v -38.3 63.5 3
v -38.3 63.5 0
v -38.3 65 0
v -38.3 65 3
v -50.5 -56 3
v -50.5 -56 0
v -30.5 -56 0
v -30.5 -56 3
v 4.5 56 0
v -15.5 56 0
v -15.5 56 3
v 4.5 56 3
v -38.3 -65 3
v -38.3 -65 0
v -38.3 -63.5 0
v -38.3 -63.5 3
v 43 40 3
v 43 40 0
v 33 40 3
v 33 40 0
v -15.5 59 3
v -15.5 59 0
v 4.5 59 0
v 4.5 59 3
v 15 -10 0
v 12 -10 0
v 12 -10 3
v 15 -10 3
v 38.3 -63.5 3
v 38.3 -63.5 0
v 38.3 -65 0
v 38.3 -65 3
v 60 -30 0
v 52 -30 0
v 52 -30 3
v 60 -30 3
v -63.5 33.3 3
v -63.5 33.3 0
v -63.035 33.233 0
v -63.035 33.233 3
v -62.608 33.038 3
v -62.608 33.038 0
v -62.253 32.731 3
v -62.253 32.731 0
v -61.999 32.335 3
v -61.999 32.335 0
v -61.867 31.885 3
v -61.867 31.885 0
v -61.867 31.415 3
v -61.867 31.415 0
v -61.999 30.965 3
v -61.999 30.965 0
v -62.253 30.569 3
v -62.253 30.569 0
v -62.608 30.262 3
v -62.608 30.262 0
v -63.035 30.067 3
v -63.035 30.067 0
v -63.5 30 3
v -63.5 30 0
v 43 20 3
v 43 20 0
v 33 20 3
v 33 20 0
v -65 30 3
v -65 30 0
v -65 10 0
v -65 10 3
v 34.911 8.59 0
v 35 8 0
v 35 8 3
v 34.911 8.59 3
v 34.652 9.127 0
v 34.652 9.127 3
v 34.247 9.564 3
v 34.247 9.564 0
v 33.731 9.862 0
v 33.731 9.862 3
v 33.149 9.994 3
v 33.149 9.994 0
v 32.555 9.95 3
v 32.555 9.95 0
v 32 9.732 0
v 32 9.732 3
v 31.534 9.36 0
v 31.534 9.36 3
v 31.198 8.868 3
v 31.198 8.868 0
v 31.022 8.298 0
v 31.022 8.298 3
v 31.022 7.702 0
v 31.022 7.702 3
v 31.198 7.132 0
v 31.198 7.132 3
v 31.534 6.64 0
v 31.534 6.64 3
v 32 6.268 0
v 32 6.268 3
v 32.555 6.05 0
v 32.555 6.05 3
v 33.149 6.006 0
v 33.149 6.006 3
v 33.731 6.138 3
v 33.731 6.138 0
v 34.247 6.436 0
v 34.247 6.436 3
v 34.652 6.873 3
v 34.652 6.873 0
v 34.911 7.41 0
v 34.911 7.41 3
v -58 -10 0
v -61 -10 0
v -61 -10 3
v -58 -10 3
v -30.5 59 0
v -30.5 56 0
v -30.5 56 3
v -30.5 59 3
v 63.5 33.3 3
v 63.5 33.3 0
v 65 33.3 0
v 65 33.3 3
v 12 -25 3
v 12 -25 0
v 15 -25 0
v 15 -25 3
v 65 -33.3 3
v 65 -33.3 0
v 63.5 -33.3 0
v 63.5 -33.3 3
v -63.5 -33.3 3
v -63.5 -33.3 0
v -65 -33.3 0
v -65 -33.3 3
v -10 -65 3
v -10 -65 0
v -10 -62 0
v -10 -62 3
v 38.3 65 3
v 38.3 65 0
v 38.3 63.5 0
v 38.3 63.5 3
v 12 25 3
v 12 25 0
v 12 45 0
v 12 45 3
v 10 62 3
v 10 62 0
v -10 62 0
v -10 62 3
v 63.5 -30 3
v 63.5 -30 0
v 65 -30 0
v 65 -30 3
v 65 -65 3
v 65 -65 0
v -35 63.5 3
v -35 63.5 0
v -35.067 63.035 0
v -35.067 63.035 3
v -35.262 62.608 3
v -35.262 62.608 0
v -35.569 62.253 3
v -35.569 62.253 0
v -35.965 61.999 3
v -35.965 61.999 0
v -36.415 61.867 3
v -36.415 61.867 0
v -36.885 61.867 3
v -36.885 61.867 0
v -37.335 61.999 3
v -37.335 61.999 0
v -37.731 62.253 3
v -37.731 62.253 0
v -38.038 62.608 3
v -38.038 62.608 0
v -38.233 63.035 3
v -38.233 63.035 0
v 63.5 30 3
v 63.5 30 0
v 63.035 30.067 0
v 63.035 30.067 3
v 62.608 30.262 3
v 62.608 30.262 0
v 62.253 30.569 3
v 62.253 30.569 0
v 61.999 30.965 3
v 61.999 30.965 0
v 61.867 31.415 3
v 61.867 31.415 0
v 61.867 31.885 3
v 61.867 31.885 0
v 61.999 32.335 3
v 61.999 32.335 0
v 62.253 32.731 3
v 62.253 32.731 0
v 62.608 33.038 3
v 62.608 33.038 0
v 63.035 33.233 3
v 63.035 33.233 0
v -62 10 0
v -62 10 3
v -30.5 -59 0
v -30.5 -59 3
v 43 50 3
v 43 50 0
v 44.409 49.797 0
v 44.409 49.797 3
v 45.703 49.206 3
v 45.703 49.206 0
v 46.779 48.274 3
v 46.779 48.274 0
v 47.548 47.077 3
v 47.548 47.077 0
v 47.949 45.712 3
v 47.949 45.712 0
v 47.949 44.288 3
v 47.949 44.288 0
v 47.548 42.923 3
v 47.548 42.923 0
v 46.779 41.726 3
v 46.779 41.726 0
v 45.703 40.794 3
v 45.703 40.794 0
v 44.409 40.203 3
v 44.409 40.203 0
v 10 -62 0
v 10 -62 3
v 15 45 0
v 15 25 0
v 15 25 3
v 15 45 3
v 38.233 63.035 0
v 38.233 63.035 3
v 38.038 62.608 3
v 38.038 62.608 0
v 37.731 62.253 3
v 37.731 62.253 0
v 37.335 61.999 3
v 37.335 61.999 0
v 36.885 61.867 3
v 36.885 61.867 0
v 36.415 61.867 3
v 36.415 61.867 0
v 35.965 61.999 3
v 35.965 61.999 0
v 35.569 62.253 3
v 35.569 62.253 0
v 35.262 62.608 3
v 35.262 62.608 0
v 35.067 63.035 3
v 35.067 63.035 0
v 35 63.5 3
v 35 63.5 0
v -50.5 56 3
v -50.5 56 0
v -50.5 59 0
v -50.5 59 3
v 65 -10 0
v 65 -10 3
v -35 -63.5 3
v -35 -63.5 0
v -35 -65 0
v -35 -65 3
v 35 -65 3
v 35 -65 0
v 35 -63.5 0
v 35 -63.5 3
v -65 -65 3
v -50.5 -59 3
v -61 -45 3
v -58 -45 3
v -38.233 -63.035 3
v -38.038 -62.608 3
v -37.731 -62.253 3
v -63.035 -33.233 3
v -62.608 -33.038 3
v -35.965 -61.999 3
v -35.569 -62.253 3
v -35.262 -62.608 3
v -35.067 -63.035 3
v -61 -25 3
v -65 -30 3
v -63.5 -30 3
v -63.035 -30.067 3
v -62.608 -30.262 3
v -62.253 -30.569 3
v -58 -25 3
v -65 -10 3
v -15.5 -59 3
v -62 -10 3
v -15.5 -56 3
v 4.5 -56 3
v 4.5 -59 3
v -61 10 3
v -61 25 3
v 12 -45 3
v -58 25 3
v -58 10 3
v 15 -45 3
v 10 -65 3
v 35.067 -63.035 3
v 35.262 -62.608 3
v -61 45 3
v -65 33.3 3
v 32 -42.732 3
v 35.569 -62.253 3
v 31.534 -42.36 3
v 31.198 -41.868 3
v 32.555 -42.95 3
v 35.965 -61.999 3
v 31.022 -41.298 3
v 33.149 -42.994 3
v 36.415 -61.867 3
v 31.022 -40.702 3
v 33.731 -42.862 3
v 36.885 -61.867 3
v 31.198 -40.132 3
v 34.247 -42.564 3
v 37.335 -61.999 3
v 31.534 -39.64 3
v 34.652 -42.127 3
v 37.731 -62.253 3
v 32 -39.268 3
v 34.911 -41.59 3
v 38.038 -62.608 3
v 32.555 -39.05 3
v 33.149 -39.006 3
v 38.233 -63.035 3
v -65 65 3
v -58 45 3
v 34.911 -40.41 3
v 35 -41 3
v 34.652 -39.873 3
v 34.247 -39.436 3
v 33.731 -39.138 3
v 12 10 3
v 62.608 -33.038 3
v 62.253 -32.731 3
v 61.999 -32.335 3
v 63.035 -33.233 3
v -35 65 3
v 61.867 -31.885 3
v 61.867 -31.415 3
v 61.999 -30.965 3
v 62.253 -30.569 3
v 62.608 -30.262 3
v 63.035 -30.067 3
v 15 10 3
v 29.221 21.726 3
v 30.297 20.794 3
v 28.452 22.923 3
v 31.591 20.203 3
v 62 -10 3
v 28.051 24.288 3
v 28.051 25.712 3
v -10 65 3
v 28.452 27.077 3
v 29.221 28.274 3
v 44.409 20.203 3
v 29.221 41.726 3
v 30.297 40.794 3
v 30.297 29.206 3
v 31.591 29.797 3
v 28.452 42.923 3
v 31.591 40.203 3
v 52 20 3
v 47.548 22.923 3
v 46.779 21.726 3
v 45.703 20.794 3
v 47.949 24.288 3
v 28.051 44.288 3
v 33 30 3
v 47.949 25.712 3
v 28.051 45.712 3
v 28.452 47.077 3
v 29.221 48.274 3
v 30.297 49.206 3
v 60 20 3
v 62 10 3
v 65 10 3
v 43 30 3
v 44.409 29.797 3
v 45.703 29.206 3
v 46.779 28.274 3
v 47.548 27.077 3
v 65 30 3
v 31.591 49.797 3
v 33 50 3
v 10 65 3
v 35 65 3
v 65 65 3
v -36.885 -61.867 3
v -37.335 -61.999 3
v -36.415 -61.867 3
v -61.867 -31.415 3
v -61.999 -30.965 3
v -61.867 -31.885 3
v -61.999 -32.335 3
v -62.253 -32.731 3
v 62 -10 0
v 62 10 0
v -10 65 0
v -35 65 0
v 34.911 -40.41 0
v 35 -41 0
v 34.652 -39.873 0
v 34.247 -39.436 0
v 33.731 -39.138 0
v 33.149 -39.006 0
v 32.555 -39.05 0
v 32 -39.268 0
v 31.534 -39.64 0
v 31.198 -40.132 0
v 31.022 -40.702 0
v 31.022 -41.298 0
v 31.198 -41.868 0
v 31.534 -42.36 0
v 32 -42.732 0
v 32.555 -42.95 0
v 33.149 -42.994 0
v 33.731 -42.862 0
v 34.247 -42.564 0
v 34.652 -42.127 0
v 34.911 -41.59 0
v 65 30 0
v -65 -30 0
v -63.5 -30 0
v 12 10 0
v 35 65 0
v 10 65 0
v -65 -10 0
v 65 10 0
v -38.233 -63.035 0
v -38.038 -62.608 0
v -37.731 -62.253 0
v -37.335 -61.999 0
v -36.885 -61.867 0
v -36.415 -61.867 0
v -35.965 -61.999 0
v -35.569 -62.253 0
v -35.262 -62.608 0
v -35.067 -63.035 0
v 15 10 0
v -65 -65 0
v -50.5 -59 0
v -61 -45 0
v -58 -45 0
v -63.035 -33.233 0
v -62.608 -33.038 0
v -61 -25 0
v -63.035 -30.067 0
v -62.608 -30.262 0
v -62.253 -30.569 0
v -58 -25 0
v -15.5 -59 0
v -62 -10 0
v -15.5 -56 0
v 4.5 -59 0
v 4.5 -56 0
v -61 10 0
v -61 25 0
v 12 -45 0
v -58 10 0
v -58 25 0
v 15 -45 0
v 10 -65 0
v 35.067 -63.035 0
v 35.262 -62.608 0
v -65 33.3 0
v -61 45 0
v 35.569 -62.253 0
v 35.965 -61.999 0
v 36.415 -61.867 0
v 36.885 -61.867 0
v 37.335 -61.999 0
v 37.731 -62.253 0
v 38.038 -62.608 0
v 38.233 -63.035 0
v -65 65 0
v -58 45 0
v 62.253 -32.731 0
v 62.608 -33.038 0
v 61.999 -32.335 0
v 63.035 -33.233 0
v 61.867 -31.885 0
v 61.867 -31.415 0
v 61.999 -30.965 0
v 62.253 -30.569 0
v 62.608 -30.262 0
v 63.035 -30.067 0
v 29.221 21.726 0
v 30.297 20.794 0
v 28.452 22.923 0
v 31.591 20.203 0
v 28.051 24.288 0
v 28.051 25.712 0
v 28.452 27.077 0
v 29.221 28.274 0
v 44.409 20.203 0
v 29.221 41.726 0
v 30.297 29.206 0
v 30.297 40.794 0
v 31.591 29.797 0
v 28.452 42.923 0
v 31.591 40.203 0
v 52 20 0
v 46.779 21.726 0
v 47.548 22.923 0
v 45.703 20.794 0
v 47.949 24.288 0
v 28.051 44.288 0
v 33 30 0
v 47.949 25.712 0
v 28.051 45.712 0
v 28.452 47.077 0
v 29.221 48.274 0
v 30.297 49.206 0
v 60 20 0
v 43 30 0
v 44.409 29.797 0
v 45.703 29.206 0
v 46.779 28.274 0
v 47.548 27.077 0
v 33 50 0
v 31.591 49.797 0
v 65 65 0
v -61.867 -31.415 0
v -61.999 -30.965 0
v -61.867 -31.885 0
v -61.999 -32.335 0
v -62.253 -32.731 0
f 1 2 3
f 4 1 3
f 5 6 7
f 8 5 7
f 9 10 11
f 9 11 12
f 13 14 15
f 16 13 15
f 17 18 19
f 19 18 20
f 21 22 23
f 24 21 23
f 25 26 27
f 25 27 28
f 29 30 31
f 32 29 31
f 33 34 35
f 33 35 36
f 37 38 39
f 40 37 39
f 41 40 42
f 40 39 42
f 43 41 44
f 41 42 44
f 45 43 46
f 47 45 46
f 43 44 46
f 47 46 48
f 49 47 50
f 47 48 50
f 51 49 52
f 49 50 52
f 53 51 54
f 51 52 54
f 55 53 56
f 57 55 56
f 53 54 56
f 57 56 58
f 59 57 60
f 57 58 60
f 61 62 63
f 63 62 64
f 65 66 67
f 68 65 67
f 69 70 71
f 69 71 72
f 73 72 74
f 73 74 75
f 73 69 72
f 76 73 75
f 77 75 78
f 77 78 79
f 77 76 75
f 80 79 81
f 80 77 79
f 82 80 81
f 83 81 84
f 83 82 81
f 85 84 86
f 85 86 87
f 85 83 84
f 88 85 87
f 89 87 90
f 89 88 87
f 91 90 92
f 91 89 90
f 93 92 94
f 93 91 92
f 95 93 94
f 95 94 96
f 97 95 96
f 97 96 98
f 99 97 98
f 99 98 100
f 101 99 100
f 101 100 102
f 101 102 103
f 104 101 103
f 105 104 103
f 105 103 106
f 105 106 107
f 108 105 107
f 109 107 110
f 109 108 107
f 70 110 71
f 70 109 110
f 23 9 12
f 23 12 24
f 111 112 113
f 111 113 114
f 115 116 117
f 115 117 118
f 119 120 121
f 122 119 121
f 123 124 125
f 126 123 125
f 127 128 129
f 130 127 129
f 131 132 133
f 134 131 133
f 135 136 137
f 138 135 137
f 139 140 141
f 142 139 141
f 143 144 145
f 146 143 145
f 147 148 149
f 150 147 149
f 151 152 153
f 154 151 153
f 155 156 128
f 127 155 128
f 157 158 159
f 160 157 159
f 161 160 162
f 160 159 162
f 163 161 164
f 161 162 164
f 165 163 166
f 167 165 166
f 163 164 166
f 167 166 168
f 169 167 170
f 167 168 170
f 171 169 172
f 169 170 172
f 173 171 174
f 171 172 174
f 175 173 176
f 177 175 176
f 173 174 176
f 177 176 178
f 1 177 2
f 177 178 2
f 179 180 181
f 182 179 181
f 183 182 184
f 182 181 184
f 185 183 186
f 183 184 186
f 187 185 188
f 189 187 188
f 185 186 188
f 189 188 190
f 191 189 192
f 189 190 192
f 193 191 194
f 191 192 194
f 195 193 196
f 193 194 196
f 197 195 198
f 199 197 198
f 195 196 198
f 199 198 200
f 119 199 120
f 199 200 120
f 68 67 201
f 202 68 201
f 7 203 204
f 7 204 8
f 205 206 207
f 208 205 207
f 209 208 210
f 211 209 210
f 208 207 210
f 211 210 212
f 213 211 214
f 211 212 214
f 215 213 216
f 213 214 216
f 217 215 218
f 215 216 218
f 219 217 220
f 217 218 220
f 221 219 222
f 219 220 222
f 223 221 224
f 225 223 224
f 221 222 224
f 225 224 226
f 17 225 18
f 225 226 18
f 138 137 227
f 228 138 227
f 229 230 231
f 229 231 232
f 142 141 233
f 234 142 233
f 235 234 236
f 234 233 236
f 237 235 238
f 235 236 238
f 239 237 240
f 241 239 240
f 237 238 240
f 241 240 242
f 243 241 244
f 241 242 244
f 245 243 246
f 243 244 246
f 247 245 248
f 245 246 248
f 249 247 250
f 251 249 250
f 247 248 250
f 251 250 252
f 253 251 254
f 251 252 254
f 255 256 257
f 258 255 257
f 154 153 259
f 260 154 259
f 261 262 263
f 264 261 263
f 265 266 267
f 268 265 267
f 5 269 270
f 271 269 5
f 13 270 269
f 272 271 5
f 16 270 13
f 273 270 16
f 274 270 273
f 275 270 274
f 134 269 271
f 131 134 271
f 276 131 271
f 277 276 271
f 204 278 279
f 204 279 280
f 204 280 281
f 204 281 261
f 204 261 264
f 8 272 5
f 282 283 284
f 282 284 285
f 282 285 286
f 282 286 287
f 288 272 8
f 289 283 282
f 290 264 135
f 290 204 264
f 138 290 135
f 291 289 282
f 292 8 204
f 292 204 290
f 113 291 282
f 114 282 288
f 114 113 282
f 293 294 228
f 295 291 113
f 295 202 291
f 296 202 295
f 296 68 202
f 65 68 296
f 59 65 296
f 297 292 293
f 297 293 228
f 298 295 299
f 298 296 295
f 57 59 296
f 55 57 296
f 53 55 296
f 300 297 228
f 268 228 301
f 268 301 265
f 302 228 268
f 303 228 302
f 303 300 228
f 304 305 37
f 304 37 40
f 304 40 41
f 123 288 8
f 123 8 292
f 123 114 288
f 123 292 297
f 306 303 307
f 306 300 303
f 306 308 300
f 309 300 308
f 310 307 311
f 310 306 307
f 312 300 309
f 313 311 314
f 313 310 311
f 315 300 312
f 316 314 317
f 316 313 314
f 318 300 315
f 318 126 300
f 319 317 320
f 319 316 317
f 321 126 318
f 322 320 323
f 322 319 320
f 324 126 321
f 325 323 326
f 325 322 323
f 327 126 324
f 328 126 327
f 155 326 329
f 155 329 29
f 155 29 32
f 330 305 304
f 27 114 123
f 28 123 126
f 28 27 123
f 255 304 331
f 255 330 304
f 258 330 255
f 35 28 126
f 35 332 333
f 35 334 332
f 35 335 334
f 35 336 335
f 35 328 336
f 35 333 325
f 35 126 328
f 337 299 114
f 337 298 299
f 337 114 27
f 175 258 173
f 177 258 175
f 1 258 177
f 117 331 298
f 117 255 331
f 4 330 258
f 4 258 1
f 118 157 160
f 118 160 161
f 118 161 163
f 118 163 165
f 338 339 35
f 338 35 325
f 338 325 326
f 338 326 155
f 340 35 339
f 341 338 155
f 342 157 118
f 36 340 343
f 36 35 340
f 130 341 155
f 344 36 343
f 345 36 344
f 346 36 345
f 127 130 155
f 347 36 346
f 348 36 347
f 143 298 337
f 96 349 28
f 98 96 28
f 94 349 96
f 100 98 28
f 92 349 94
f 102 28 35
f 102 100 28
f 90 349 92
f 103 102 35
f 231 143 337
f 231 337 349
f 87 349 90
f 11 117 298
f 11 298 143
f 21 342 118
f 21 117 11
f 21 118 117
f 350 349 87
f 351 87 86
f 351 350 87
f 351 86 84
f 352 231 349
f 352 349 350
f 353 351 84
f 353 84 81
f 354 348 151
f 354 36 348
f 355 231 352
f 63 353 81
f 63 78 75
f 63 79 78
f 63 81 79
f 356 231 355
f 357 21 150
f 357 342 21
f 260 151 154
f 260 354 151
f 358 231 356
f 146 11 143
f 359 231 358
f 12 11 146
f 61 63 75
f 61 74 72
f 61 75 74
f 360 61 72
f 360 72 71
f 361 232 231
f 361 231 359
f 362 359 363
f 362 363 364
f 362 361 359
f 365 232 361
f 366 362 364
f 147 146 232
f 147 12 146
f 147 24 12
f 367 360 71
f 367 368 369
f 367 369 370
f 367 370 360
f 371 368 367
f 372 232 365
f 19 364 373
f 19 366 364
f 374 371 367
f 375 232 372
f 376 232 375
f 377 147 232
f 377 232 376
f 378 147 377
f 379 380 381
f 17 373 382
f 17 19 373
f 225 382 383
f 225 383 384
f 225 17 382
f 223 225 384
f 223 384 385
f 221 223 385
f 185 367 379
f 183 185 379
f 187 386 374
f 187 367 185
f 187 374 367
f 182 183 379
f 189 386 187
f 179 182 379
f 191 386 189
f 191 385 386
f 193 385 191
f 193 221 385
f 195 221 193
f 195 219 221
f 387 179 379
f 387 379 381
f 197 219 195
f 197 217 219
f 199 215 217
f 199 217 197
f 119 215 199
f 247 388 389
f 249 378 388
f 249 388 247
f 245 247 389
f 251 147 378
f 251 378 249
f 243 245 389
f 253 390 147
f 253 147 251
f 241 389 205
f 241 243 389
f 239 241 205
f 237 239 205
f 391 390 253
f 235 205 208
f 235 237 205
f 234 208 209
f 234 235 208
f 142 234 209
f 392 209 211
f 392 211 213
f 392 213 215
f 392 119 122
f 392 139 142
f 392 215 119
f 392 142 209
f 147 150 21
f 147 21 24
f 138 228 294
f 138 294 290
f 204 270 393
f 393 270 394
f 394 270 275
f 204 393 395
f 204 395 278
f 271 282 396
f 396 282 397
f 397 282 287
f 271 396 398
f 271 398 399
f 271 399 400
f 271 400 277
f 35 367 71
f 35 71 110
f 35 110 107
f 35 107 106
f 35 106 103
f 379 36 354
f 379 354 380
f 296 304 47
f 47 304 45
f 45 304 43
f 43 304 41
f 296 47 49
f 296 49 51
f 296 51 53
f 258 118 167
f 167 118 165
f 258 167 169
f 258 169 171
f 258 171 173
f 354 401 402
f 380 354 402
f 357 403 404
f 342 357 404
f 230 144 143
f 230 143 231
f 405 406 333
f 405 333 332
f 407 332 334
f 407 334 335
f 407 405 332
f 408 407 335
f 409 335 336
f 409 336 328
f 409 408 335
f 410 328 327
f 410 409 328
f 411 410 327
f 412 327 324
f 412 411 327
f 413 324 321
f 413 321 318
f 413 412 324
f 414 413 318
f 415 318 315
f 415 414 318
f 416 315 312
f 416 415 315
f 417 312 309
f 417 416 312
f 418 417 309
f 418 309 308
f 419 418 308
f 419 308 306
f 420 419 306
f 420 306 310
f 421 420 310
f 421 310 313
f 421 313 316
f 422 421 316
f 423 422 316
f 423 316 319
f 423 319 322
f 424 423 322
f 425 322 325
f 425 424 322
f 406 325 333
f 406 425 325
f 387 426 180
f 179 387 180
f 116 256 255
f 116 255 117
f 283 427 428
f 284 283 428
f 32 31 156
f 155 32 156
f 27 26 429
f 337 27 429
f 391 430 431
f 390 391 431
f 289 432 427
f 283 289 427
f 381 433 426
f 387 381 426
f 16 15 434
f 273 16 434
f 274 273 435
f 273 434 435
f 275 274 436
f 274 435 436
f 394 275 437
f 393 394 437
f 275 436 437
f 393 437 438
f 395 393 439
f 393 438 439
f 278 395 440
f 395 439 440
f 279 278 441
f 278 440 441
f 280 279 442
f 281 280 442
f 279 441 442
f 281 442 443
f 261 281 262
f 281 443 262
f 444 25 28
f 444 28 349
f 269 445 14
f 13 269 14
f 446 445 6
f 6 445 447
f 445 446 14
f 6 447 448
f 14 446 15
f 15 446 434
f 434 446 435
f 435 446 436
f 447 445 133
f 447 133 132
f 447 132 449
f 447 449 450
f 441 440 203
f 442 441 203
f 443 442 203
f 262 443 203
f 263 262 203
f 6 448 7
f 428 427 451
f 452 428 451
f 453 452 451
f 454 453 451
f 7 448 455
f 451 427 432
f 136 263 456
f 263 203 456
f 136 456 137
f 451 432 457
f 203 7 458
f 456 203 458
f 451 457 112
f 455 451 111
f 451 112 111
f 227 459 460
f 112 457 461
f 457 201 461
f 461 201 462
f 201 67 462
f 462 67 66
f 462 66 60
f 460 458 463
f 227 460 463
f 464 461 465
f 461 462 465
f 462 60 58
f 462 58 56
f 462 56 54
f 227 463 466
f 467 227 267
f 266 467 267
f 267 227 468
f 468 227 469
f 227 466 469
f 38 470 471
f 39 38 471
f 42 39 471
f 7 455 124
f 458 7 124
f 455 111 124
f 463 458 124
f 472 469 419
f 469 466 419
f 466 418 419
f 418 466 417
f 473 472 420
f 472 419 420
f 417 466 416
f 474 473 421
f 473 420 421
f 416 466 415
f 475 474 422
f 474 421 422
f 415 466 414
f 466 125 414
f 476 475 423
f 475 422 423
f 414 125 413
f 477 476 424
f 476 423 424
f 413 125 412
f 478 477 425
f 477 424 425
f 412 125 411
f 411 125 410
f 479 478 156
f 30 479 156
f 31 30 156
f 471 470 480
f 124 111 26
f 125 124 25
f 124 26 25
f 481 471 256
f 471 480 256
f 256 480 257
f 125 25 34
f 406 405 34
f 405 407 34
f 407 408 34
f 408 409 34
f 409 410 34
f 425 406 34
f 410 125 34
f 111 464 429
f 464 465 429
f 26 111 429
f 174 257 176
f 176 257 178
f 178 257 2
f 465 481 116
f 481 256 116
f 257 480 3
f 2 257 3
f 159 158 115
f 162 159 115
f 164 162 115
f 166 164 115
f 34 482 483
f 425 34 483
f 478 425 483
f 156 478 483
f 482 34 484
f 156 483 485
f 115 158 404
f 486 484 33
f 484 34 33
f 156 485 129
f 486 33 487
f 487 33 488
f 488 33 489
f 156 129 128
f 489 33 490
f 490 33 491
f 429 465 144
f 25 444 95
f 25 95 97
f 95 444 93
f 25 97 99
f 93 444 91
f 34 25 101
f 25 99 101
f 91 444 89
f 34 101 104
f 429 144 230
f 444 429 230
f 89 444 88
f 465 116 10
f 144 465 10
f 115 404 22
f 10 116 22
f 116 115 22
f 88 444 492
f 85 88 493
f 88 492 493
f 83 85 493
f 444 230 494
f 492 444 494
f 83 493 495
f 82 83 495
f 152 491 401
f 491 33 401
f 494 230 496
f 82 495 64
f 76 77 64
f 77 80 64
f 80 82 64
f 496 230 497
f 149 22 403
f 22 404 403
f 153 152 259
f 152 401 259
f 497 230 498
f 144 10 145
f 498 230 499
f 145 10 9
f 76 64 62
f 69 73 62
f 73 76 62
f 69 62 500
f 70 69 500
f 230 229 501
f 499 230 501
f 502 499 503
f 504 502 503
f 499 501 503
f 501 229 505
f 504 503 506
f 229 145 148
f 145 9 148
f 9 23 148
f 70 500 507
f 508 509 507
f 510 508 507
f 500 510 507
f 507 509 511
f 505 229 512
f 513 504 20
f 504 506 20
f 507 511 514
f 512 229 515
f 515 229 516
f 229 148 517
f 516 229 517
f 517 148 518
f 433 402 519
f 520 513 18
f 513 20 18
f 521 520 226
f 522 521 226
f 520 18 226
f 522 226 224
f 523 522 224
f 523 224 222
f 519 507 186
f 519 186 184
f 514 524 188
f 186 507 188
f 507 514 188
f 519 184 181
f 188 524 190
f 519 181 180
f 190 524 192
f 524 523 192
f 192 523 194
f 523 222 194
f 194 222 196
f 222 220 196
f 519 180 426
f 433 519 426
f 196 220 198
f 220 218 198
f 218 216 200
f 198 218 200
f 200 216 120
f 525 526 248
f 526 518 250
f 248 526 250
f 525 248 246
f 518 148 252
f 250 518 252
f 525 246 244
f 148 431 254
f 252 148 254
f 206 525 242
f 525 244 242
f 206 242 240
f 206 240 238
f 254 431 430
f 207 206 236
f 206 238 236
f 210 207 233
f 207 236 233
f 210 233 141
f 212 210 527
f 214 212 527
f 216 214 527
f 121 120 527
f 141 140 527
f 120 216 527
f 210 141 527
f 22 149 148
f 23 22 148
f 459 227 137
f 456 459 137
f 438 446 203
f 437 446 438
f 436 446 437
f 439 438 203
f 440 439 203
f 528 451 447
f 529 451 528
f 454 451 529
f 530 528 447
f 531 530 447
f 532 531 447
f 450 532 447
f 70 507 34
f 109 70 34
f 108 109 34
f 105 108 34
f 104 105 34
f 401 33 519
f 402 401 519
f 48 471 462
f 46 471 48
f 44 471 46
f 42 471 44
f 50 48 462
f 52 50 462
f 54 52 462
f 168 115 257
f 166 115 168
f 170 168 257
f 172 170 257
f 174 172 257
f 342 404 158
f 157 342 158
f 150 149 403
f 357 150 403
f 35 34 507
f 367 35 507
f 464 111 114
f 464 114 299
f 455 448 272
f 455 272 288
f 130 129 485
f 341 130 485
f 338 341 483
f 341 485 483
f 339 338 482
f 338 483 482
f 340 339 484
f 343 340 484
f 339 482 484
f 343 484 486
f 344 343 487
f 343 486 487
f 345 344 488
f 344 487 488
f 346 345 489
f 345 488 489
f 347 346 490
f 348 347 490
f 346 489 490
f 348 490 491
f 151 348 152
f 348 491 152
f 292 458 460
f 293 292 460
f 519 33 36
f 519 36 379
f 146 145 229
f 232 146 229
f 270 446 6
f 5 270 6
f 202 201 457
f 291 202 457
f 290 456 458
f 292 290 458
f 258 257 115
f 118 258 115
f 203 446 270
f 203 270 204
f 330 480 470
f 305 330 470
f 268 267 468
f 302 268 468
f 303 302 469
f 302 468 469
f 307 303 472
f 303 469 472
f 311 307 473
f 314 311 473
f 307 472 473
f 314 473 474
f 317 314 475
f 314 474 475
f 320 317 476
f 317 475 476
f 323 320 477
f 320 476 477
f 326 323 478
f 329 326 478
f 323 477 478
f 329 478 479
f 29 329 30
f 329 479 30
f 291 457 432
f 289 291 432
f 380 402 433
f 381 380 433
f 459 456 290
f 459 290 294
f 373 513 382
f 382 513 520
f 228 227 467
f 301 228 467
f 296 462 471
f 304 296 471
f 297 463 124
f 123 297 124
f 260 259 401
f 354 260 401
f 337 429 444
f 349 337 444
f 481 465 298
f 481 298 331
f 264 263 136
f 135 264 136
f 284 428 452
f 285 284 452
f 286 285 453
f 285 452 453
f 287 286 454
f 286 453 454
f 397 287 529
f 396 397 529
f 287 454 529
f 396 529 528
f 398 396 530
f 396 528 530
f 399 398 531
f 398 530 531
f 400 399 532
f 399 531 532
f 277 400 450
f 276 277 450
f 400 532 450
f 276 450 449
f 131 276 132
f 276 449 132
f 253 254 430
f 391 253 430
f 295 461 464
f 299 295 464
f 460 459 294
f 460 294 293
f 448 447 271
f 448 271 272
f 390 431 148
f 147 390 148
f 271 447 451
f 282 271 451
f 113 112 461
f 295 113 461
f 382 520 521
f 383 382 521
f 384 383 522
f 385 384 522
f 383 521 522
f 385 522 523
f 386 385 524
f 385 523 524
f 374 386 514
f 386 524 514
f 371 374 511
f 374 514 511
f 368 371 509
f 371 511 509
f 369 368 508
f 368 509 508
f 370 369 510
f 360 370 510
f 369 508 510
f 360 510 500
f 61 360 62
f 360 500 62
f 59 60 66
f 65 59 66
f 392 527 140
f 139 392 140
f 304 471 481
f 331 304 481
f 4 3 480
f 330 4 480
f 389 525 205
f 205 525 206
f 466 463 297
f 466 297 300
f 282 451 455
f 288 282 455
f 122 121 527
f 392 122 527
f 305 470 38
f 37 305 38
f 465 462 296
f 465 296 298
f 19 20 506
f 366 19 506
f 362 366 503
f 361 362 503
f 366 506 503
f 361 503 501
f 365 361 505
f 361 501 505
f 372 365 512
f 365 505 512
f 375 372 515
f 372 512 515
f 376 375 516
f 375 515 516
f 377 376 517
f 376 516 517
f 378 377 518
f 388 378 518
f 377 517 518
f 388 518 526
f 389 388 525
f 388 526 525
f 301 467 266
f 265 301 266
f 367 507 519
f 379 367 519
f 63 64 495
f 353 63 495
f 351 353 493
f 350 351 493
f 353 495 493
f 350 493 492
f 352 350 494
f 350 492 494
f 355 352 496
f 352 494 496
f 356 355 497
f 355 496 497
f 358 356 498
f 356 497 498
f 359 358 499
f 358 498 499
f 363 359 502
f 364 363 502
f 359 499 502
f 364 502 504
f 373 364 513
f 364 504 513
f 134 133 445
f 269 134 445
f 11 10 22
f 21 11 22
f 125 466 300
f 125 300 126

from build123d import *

# Parameters (mm, degrees)
SKETCH1_W           = 20
SKETCH1_H           = 3
SKETCH1_W_2         = 3
SKETCH1_H_2         = 20
SKETCH1_R           = 2
SKETCH1_W_3         = 8
SKETCH1_H_3         = 50
BOSS_EXTRUDE1_DEPTH = 3


with BuildPart() as part:
    # Sketch1 → Boss-Extrude1 (new body)
    with BuildSketch(Plane.XY):
        with BuildLine():
            Line((10, -62), (10, -65))
            Line((10, -65), (35, -65))
            Line((35, -65), (35, -63.5))
            ThreePointArc((35, -63.5), (36.65, -61.85), (38.3, -63.5))
            Line((38.3, -63.5), (38.3, -65))
            Line((38.3, -65), (65, -65))
            Line((65, -65), (65, -33.3))
            Line((65, -33.3), (63.5, -33.3))
            ThreePointArc((63.5, -33.3), (61.85, -31.65), (63.5, -30))
            Line((63.5, -30), (65, -30))
            Line((65, -30), (65, -10))
            Line((65, -10), (62, -10))
            Line((62, -10), (62, 10))
            Line((62, 10), (65, 10))
            Line((65, 10), (65, 30))
            Line((65, 30), (63.5, 30))
            ThreePointArc((63.5, 30), (61.85, 31.65), (63.5, 33.3))
            Line((63.5, 33.3), (65, 33.3))
            Line((65, 33.3), (65, 65))
            Line((65, 65), (38.3, 65))
            Line((38.3, 65), (38.3, 63.5))
            ThreePointArc((38.3, 63.5), (36.65, 61.85), (35, 63.5))
            Line((35, 63.5), (35, 65))
            Line((35, 65), (10, 65))
            Line((10, 65), (10, 62))
            Line((10, 62), (-10, 62))
            Line((-10, 62), (-10, 65))
            Line((-10, 65), (-35, 65))
            Line((-35, 65), (-35, 63.5))
            ThreePointArc((-35, 63.5), (-36.65, 61.85), (-38.3, 63.5))
            Line((-38.3, 63.5), (-38.3, 65))
            Line((-38.3, 65), (-65, 65))
            Line((-65, 65), (-65, 33.3))
            Line((-65, 33.3), (-63.5, 33.3))
            ThreePointArc((-63.5, 33.3), (-61.85, 31.65), (-63.5, 30))
            Line((-63.5, 30), (-65, 30))
            Line((-65, 30), (-65, 10))
            Line((-65, 10), (-62, 10))
            Line((-62, 10), (-62, -10))
            Line((-62, -10), (-65, -10))
            Line((-65, -10), (-65, -30))
            Line((-65, -30), (-63.5, -30))
            ThreePointArc((-63.5, -30), (-61.85, -31.65), (-63.5, -33.3))
            Line((-63.5, -33.3), (-65, -33.3))
            Line((-65, -33.3), (-65, -65))
            Line((-65, -65), (-38.3, -65))
            Line((-38.3, -65), (-38.3, -63.5))
            ThreePointArc((-38.3, -63.5), (-36.65, -61.85), (-35, -63.5))
            Line((-35, -63.5), (-35, -65))
            Line((-35, -65), (-10, -65))
            Line((-10, -65), (-10, -62))
            Line((-10, -62), (10, -62))
        make_face()
        with Locations((-40.5, -57.5)):
            Rectangle(SKETCH1_W, SKETCH1_H, mode=Mode.SUBTRACT)
        with Locations((-59.5, -35)):
            Rectangle(SKETCH1_W_2, SKETCH1_H_2, mode=Mode.SUBTRACT)
        with Locations((-5.5, -57.5)):
            Rectangle(SKETCH1_W, SKETCH1_H, mode=Mode.SUBTRACT)
        with Locations((13.5, -35)):
            Rectangle(SKETCH1_W_2, SKETCH1_H_2, mode=Mode.SUBTRACT)
        with Locations((33, -41)):
            Circle(SKETCH1_R, mode=Mode.SUBTRACT)
        with Locations((56, -5)):
            Rectangle(SKETCH1_W_3, SKETCH1_H_3, mode=Mode.SUBTRACT)
        with Locations((-59.5, 0)):
            Rectangle(SKETCH1_W_2, SKETCH1_H_2, mode=Mode.SUBTRACT)
        with Locations((-59.5, 35)):
            Rectangle(SKETCH1_W_2, SKETCH1_H_2, mode=Mode.SUBTRACT)
        with Locations((-40.5, 57.5)):
            Rectangle(SKETCH1_W, SKETCH1_H, mode=Mode.SUBTRACT)
        with Locations((-5.5, 57.5)):
            Rectangle(SKETCH1_W, SKETCH1_H, mode=Mode.SUBTRACT)
        with Locations((13.5, 0)):
            Rectangle(SKETCH1_W_2, SKETCH1_H_2, mode=Mode.SUBTRACT)
        with Locations((33, 8)):
            Circle(SKETCH1_R, mode=Mode.SUBTRACT)
        with BuildLine():
            ThreePointArc((33, 20), (28, 25), (33, 30))
            Line((33, 30), (43, 30))
            ThreePointArc((43, 30), (48, 25), (43, 20))
            Line((43, 20), (33, 20))
        make_face(mode=Mode.SUBTRACT)
        with Locations((13.5, 35)):
            Rectangle(SKETCH1_W_2, SKETCH1_H_2, mode=Mode.SUBTRACT)
        with BuildLine():
            ThreePointArc((43, 50), (48, 45), (43, 40))
            Line((43, 40), (33, 40))
            ThreePointArc((33, 40), (28, 45), (33, 50))
            Line((33, 50), (43, 50))
        make_face(mode=Mode.SUBTRACT)
    extrude(amount=BOSS_EXTRUDE1_DEPTH)


solid = part.part
